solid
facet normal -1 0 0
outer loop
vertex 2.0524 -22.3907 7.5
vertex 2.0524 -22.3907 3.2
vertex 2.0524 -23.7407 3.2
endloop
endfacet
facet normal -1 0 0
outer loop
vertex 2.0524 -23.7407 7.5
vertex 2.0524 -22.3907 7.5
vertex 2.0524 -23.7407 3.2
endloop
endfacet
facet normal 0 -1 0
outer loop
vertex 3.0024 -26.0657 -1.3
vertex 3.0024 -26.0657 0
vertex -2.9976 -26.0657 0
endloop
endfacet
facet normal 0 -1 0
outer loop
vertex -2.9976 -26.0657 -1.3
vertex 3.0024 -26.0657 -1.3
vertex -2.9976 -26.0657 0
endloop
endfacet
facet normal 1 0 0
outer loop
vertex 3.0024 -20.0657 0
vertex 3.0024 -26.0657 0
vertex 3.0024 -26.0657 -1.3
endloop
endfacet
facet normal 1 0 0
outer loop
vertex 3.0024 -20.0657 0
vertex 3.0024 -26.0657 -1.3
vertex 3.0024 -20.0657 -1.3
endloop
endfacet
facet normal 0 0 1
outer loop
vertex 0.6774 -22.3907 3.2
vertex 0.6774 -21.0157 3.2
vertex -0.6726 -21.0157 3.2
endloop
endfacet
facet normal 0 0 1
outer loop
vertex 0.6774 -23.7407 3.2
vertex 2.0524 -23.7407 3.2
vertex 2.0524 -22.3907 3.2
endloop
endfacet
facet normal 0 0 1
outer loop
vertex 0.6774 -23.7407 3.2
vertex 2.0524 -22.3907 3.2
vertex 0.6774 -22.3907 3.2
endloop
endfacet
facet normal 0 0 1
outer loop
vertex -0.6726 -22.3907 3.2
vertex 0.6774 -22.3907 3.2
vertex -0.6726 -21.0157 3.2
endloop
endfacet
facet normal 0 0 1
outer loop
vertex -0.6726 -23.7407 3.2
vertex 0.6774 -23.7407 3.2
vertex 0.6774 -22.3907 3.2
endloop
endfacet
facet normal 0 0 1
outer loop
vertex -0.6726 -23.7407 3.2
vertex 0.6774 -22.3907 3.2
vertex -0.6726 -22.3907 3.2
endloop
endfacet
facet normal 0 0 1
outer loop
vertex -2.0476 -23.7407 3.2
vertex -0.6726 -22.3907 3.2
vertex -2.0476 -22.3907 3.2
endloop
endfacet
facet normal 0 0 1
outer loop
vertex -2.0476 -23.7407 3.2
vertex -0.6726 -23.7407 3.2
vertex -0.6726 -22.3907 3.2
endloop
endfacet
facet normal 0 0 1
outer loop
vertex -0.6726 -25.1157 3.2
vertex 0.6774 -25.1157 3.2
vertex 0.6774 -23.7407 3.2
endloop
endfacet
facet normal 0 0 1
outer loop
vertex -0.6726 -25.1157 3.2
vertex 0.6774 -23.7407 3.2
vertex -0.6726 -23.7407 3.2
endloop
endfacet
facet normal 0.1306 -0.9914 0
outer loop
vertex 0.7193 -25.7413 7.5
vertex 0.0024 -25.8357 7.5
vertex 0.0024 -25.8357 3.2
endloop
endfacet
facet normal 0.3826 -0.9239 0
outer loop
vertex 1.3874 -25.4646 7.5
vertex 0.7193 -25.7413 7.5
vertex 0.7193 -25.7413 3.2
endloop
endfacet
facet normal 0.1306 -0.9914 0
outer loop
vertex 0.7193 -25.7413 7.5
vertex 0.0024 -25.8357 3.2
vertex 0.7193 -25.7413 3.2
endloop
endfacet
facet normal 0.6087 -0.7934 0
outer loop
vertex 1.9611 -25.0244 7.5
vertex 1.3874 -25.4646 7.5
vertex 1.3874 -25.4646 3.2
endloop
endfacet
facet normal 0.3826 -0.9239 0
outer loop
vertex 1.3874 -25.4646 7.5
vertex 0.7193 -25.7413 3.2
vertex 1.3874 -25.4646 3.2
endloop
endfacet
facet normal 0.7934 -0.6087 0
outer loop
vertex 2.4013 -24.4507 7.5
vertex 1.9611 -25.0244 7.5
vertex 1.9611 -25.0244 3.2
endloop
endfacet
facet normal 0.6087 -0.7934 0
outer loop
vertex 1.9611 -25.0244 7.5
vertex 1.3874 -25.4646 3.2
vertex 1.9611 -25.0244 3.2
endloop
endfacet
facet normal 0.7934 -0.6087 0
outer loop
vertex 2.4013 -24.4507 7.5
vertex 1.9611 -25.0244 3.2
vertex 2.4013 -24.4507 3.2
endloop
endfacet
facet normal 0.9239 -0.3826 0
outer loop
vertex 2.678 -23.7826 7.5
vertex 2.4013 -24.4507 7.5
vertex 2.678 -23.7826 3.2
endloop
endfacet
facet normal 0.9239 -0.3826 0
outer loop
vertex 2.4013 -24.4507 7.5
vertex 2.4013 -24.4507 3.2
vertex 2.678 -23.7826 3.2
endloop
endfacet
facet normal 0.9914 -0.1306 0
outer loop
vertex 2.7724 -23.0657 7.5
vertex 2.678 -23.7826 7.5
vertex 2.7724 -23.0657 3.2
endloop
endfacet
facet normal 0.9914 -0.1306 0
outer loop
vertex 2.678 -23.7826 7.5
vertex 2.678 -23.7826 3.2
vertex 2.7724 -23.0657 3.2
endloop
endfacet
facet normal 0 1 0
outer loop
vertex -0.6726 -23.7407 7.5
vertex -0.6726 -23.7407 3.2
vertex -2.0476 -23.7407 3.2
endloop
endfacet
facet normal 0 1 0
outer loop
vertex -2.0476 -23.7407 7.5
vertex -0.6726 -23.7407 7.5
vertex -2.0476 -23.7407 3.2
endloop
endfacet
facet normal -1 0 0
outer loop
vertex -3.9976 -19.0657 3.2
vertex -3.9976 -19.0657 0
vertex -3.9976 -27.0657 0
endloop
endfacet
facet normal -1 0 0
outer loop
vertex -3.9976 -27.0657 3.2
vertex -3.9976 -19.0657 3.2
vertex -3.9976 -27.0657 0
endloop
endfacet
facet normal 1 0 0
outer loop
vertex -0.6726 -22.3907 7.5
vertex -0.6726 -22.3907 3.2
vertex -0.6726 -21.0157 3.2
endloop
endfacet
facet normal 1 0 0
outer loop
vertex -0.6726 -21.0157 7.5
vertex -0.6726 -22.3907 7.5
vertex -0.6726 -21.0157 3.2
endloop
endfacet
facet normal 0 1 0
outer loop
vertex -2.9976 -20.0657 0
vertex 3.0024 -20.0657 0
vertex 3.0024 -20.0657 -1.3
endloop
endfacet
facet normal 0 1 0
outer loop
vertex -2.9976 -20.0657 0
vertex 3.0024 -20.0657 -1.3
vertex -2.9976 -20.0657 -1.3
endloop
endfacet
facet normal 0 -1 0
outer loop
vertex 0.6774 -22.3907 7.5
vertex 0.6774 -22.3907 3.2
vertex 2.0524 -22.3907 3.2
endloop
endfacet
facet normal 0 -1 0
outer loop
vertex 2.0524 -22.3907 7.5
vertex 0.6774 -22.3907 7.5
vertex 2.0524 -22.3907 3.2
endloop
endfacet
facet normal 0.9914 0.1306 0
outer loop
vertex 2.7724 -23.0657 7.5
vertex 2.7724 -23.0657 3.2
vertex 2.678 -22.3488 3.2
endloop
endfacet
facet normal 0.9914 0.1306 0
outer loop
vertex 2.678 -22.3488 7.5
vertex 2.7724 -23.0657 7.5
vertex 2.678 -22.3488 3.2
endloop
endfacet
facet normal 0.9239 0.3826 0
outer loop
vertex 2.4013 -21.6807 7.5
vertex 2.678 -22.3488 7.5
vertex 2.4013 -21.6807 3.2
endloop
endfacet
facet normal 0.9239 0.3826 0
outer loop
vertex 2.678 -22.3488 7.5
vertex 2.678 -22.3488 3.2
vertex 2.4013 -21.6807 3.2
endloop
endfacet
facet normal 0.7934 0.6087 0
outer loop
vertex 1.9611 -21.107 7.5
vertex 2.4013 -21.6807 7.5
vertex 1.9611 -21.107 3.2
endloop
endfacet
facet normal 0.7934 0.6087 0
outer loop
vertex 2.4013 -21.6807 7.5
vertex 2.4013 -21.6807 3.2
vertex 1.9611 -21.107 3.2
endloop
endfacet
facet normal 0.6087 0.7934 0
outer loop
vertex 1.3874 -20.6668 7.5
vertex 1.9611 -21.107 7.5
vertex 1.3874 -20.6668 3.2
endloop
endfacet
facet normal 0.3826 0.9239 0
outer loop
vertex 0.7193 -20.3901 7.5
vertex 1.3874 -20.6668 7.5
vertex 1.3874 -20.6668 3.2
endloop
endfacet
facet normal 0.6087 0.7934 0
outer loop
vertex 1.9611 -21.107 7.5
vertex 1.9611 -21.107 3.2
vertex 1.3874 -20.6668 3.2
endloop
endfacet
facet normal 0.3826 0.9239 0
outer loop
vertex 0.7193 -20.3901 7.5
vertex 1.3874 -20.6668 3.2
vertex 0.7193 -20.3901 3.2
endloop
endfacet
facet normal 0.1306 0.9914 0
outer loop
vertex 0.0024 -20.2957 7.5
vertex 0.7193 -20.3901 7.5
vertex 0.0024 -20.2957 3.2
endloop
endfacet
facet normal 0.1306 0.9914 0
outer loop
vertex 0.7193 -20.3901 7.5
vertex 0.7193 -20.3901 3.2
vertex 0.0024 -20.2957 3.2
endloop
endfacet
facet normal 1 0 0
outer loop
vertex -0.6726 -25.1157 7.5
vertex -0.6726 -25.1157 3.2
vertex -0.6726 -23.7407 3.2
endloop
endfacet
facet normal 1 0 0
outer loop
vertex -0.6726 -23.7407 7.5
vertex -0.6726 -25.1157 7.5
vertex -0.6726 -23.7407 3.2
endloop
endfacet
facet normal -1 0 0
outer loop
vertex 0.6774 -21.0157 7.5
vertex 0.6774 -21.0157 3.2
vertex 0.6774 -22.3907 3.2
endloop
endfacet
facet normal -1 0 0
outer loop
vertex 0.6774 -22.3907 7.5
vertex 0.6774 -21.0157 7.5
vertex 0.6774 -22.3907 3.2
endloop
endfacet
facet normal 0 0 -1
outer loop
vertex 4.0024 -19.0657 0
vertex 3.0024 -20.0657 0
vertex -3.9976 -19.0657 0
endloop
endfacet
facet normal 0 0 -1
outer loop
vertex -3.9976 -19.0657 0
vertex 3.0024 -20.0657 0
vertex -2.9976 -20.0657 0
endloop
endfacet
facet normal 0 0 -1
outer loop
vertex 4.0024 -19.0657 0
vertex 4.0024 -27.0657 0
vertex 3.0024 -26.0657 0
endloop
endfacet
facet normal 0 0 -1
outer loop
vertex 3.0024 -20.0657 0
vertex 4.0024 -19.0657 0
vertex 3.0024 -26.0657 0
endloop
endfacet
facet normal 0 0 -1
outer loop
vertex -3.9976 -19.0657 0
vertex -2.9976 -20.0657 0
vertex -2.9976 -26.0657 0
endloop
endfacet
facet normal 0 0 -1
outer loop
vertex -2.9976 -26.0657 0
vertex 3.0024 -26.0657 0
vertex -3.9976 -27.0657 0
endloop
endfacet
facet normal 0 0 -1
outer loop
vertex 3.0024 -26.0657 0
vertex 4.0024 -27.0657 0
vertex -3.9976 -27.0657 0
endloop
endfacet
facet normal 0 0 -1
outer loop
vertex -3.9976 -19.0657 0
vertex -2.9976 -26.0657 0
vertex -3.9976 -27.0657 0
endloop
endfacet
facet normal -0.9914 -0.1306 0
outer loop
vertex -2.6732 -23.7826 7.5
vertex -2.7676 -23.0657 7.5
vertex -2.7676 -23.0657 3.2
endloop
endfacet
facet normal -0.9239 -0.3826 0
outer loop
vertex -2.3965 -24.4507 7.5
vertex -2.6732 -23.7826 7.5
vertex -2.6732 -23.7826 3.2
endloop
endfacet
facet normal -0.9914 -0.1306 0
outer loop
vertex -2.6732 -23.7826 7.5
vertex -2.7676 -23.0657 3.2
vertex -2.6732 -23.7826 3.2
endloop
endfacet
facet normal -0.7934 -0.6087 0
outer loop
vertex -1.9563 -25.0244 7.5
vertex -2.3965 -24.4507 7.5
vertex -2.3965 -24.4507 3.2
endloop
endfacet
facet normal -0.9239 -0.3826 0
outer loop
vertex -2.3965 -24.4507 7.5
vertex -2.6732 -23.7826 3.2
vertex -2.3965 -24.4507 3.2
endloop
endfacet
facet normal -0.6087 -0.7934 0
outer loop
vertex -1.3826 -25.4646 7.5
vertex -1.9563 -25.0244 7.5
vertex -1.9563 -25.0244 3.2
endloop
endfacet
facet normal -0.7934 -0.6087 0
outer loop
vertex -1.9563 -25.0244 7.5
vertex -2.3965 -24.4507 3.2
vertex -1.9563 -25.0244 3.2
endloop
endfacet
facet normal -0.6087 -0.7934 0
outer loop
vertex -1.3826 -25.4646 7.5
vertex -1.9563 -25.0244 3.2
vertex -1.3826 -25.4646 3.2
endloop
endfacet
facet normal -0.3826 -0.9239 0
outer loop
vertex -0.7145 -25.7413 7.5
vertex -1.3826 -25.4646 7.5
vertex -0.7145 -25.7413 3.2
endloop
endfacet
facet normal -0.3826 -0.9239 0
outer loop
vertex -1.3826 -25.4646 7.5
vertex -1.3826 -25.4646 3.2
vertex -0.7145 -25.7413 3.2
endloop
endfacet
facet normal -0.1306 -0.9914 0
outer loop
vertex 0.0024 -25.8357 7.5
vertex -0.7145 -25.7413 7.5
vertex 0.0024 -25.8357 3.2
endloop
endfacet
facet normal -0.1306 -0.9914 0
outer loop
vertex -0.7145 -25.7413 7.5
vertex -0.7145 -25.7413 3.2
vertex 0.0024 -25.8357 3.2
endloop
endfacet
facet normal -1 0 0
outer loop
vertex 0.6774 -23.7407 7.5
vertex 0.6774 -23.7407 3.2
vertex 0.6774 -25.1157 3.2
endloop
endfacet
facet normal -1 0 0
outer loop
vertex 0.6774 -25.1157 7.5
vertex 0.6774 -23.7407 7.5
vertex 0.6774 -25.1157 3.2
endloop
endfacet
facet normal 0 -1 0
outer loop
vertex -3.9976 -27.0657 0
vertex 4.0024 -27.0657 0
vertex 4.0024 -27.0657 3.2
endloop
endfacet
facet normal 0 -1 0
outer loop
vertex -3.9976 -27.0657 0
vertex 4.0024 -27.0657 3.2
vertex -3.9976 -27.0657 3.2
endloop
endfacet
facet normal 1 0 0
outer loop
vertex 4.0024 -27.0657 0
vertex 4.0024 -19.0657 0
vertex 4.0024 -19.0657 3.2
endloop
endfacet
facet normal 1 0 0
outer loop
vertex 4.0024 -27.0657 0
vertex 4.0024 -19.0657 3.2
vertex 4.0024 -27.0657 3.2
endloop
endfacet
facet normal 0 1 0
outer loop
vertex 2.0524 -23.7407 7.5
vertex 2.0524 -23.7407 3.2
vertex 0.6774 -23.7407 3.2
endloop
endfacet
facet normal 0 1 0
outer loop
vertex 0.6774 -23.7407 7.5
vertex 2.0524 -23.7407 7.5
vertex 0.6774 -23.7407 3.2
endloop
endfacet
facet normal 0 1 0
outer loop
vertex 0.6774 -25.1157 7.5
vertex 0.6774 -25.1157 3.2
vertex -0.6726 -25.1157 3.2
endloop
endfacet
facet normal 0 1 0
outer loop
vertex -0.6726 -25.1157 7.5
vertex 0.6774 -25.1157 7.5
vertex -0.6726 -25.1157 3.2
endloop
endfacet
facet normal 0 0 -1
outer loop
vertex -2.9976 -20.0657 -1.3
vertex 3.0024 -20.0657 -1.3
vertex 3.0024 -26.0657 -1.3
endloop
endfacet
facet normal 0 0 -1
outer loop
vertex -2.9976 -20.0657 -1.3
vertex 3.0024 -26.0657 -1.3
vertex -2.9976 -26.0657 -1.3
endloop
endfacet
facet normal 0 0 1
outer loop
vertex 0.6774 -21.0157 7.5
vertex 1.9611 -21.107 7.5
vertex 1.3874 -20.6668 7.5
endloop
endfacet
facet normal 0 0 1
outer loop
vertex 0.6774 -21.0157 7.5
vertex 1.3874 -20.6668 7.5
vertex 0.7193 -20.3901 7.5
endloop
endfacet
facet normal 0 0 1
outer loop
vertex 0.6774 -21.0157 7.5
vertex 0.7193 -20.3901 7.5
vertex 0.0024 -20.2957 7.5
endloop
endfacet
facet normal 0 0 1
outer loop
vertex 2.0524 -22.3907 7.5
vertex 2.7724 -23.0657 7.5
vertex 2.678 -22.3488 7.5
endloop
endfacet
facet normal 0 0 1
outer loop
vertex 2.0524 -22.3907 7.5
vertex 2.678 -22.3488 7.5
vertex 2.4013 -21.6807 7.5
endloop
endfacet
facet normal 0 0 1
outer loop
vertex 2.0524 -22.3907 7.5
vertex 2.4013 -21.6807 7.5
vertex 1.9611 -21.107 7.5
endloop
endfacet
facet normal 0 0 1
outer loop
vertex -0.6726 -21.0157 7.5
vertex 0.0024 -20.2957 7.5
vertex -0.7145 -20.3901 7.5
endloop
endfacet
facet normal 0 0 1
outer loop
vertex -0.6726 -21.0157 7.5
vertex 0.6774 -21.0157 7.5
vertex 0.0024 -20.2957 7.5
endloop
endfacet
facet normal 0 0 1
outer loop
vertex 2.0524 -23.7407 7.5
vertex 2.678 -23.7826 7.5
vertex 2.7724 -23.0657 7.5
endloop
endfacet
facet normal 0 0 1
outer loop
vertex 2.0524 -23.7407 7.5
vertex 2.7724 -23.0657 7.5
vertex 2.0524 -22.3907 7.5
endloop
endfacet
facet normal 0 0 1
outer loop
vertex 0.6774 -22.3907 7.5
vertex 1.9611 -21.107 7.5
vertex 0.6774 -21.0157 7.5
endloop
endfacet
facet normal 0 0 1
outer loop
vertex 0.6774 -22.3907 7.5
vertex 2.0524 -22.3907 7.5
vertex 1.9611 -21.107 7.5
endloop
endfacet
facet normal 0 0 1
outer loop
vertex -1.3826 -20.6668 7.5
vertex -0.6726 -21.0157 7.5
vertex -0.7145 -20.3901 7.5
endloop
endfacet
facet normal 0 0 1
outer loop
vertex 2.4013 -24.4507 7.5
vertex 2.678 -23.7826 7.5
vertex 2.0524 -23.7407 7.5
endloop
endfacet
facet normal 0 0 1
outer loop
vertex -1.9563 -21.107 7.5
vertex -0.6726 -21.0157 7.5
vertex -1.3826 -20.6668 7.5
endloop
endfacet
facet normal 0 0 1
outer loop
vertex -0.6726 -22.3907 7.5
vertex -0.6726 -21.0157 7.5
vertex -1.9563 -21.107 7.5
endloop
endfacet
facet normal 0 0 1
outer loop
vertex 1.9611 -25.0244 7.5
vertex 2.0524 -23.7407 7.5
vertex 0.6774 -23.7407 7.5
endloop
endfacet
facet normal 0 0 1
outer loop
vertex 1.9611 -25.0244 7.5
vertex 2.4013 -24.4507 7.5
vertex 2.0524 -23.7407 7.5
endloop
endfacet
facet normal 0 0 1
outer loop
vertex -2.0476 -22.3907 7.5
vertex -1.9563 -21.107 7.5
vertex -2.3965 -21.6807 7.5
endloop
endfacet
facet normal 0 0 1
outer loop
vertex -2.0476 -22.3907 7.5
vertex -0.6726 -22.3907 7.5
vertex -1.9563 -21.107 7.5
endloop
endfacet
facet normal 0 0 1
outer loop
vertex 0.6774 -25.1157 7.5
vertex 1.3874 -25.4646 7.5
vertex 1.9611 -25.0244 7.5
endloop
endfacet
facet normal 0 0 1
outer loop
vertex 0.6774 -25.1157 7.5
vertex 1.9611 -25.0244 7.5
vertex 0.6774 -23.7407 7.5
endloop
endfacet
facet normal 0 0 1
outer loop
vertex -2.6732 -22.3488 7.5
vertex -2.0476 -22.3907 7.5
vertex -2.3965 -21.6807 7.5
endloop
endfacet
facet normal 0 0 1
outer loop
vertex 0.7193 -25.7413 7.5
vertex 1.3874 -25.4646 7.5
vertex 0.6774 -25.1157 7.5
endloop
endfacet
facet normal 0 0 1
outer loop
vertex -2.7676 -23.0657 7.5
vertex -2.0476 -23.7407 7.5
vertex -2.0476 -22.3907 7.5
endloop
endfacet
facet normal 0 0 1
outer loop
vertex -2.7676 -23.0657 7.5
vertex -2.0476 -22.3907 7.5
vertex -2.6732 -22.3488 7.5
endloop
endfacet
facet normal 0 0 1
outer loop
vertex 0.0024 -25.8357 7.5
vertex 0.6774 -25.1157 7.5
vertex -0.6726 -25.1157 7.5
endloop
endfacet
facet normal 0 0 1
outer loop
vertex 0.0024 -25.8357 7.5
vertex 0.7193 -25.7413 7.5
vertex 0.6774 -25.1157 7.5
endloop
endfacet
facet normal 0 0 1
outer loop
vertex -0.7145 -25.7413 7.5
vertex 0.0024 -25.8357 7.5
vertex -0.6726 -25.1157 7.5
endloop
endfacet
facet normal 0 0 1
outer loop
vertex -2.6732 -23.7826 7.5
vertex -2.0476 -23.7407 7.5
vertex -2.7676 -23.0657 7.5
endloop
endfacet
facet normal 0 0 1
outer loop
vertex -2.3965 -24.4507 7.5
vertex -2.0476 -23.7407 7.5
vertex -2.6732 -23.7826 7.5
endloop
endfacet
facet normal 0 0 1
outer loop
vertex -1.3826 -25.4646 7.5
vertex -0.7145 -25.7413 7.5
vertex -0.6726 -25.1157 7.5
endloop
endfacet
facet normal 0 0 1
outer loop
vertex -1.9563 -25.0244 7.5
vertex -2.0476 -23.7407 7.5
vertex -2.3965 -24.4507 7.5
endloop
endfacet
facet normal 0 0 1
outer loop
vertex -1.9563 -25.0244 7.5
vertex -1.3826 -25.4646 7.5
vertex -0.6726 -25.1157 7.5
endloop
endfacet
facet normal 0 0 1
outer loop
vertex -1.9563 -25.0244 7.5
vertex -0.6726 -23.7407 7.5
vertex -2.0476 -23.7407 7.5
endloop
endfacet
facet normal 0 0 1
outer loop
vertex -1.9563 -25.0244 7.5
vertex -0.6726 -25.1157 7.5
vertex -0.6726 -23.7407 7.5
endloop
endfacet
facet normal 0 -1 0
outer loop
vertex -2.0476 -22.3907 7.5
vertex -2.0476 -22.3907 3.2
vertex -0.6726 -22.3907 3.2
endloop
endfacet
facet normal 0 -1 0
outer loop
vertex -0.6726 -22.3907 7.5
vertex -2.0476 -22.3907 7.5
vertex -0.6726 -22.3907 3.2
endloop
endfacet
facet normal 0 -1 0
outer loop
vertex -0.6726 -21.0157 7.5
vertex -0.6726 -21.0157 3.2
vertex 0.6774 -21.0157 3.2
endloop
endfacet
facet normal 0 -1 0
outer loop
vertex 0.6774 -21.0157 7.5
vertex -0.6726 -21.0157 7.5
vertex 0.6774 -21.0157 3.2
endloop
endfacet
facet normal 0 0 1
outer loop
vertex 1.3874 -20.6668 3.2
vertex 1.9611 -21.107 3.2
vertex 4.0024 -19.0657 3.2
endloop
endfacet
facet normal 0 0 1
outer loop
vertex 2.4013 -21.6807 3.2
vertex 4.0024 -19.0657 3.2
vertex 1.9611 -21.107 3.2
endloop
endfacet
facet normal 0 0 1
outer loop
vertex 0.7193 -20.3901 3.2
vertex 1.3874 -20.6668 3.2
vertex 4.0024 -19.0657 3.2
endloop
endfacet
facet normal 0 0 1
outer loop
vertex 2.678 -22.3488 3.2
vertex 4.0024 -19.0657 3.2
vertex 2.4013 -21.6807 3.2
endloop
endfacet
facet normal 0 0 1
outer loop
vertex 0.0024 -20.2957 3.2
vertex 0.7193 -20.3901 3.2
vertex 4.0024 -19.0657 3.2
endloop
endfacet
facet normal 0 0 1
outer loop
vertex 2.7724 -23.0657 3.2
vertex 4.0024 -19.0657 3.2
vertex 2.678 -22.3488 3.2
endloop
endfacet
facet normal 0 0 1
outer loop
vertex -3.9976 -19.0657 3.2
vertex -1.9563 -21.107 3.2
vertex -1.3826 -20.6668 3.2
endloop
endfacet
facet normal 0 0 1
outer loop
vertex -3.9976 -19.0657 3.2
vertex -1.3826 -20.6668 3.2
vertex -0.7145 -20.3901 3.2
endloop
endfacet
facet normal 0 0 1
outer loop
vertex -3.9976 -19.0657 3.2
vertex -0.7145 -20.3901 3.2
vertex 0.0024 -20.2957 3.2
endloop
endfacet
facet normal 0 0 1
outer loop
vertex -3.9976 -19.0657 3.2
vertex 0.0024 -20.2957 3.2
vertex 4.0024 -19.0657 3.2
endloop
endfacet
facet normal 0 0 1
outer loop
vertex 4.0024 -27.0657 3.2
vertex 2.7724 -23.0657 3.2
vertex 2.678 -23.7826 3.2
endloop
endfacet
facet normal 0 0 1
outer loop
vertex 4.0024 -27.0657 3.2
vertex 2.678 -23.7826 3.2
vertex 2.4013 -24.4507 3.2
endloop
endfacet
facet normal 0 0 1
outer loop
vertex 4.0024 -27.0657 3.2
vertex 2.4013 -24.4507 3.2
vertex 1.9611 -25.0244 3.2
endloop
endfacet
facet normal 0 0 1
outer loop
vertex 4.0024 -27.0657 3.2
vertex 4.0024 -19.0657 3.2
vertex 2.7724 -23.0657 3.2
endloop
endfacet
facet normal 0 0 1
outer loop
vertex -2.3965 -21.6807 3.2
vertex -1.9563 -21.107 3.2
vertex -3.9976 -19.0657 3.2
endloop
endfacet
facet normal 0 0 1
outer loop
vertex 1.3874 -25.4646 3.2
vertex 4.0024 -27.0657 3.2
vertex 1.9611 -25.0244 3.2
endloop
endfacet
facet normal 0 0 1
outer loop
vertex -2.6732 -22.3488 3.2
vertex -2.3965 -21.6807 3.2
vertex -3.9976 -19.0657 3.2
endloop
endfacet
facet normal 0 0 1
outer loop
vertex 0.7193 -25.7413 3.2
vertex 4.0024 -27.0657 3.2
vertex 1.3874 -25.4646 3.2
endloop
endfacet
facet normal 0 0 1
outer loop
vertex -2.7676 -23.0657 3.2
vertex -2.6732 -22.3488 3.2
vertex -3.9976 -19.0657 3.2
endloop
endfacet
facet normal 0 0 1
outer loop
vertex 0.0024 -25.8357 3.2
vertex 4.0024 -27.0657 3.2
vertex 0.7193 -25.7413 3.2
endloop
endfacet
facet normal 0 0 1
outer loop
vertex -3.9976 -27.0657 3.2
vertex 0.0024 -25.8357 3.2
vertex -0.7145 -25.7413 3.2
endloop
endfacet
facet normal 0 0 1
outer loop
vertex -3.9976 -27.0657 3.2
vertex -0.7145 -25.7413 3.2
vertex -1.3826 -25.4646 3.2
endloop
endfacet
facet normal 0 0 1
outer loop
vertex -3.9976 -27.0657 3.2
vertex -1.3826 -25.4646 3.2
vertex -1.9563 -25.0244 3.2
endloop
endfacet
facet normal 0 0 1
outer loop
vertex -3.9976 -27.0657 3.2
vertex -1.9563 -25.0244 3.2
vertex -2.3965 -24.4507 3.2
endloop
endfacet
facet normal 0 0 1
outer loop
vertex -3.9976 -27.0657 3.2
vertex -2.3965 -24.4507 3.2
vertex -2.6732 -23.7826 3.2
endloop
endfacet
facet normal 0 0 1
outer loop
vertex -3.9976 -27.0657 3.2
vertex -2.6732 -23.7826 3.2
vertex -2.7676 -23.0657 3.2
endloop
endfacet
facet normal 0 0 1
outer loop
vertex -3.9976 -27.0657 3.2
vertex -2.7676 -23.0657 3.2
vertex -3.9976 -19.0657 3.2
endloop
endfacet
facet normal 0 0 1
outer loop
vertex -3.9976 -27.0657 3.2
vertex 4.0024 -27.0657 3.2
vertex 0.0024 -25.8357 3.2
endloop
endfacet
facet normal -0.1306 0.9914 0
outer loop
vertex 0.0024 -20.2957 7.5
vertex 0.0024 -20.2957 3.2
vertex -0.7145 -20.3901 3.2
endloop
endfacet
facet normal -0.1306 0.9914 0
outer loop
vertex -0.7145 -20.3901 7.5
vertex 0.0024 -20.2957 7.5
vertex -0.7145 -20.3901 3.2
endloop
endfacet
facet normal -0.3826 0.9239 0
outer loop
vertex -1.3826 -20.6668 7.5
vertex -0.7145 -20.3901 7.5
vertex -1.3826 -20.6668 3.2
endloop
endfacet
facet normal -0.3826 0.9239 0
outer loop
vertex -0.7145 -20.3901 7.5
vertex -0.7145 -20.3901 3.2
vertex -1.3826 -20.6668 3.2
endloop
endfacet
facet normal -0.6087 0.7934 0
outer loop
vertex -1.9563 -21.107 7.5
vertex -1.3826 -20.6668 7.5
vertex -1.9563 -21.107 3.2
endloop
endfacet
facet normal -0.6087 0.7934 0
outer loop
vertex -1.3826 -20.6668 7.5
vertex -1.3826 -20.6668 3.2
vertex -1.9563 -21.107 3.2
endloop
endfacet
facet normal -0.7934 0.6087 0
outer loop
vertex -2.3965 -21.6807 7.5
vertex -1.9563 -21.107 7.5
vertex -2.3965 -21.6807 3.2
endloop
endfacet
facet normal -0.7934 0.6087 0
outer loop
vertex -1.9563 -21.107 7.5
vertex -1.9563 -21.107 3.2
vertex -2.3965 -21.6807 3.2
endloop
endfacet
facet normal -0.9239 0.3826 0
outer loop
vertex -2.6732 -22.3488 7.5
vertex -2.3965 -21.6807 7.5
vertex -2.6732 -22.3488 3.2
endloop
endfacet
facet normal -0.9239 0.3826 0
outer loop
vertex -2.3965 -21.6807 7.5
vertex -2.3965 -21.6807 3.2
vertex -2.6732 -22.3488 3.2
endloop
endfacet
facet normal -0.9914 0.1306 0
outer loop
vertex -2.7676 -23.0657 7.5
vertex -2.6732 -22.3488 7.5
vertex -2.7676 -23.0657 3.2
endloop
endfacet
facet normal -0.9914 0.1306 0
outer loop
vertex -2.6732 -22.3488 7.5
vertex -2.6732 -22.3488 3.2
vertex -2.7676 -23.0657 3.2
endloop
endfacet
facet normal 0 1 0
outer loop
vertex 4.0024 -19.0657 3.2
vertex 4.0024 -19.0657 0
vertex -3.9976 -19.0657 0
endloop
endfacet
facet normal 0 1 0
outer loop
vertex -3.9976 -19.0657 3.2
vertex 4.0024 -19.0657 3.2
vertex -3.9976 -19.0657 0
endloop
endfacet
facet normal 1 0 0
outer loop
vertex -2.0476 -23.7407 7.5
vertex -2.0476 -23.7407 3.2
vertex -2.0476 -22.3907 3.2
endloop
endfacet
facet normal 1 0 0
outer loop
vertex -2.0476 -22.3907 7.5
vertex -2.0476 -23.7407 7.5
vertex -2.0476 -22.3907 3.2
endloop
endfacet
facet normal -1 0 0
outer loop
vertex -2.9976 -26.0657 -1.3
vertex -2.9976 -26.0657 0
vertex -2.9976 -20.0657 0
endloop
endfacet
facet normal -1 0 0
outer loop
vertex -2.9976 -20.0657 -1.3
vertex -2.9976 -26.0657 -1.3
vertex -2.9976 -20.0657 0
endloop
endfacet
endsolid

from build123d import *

# Parameters (mm, degrees)
BOSS_EXTRUDE1_DEPTH = 7.5
SKETCH7_W           = 8
SKETCH7_H           = 8
BOSS_EXTRUDE2_DEPTH = 3.2
SKETCH8_W           = 6
SKETCH8_H           = 6
BOSS_EXTRUDE3_DEPTH = 1.3


with BuildPart() as part:
    # Sketch6 → Boss-Extrude1 (new body)
    with BuildSketch(Plane(origin=(0, 4.132474232, 0), x_dir=(-1, 0, 0), z_dir=(0, 0, 1))):
        with BuildLine():
            ThreePointArc((-2.772388639, 27.198186003), (-1.961074426, 25.239500222), (-0.002388647, 24.428186003))
            ThreePointArc((-0.002388647, 24.428186003), (1.956297142, 25.239500216), (2.767611361, 27.198186003))
            ThreePointArc((2.767611361, 27.198186003), (1.956297145, 29.156871787), (-0.002388639, 29.968186003))
            ThreePointArc((-0.002388639, 29.968186003), (-1.961074423, 29.156871787), (-2.772388639, 27.198186003))
        make_face()
        Polygon((2.047611361, 27.873186003), (2.047611361, 26.523186003), (0.672611361, 26.523186003), (0.672611361, 25.148186003), (-0.677388639, 25.148186003), (-0.677388639, 26.523186003), (-2.052388639, 26.523186003), (-2.052388639, 27.873186003), (-0.677388639, 27.873186003), (-0.677388639, 29.248186003), (0.672611361, 29.248186003), (0.672611361, 27.873186003), align=None, mode=Mode.SUBTRACT)
    extrude(amount=BOSS_EXTRUDE1_DEPTH)

    # Sketch7 → Boss-Extrude2 (add)
    with BuildSketch(Plane(origin=(0, 0, 0), x_dir=(-1, 0, 0), z_dir=(0, 0, 1))):
        with Locations((-0.002388639, 23.065711771)):
            Rectangle(SKETCH7_W, SKETCH7_H)
    extrude(amount=BOSS_EXTRUDE2_DEPTH)

    # Sketch8 → Boss-Extrude3 (add)
    with BuildSketch(Plane(origin=(0, 0, 0), x_dir=(-1, 0, 0), z_dir=(0, 0, -1))):
        with Locations((-0.002388639, -23.065711771)):
            Rectangle(SKETCH8_W, SKETCH8_H)
    extrude(amount=BOSS_EXTRUDE3_DEPTH)


solid = part.part
